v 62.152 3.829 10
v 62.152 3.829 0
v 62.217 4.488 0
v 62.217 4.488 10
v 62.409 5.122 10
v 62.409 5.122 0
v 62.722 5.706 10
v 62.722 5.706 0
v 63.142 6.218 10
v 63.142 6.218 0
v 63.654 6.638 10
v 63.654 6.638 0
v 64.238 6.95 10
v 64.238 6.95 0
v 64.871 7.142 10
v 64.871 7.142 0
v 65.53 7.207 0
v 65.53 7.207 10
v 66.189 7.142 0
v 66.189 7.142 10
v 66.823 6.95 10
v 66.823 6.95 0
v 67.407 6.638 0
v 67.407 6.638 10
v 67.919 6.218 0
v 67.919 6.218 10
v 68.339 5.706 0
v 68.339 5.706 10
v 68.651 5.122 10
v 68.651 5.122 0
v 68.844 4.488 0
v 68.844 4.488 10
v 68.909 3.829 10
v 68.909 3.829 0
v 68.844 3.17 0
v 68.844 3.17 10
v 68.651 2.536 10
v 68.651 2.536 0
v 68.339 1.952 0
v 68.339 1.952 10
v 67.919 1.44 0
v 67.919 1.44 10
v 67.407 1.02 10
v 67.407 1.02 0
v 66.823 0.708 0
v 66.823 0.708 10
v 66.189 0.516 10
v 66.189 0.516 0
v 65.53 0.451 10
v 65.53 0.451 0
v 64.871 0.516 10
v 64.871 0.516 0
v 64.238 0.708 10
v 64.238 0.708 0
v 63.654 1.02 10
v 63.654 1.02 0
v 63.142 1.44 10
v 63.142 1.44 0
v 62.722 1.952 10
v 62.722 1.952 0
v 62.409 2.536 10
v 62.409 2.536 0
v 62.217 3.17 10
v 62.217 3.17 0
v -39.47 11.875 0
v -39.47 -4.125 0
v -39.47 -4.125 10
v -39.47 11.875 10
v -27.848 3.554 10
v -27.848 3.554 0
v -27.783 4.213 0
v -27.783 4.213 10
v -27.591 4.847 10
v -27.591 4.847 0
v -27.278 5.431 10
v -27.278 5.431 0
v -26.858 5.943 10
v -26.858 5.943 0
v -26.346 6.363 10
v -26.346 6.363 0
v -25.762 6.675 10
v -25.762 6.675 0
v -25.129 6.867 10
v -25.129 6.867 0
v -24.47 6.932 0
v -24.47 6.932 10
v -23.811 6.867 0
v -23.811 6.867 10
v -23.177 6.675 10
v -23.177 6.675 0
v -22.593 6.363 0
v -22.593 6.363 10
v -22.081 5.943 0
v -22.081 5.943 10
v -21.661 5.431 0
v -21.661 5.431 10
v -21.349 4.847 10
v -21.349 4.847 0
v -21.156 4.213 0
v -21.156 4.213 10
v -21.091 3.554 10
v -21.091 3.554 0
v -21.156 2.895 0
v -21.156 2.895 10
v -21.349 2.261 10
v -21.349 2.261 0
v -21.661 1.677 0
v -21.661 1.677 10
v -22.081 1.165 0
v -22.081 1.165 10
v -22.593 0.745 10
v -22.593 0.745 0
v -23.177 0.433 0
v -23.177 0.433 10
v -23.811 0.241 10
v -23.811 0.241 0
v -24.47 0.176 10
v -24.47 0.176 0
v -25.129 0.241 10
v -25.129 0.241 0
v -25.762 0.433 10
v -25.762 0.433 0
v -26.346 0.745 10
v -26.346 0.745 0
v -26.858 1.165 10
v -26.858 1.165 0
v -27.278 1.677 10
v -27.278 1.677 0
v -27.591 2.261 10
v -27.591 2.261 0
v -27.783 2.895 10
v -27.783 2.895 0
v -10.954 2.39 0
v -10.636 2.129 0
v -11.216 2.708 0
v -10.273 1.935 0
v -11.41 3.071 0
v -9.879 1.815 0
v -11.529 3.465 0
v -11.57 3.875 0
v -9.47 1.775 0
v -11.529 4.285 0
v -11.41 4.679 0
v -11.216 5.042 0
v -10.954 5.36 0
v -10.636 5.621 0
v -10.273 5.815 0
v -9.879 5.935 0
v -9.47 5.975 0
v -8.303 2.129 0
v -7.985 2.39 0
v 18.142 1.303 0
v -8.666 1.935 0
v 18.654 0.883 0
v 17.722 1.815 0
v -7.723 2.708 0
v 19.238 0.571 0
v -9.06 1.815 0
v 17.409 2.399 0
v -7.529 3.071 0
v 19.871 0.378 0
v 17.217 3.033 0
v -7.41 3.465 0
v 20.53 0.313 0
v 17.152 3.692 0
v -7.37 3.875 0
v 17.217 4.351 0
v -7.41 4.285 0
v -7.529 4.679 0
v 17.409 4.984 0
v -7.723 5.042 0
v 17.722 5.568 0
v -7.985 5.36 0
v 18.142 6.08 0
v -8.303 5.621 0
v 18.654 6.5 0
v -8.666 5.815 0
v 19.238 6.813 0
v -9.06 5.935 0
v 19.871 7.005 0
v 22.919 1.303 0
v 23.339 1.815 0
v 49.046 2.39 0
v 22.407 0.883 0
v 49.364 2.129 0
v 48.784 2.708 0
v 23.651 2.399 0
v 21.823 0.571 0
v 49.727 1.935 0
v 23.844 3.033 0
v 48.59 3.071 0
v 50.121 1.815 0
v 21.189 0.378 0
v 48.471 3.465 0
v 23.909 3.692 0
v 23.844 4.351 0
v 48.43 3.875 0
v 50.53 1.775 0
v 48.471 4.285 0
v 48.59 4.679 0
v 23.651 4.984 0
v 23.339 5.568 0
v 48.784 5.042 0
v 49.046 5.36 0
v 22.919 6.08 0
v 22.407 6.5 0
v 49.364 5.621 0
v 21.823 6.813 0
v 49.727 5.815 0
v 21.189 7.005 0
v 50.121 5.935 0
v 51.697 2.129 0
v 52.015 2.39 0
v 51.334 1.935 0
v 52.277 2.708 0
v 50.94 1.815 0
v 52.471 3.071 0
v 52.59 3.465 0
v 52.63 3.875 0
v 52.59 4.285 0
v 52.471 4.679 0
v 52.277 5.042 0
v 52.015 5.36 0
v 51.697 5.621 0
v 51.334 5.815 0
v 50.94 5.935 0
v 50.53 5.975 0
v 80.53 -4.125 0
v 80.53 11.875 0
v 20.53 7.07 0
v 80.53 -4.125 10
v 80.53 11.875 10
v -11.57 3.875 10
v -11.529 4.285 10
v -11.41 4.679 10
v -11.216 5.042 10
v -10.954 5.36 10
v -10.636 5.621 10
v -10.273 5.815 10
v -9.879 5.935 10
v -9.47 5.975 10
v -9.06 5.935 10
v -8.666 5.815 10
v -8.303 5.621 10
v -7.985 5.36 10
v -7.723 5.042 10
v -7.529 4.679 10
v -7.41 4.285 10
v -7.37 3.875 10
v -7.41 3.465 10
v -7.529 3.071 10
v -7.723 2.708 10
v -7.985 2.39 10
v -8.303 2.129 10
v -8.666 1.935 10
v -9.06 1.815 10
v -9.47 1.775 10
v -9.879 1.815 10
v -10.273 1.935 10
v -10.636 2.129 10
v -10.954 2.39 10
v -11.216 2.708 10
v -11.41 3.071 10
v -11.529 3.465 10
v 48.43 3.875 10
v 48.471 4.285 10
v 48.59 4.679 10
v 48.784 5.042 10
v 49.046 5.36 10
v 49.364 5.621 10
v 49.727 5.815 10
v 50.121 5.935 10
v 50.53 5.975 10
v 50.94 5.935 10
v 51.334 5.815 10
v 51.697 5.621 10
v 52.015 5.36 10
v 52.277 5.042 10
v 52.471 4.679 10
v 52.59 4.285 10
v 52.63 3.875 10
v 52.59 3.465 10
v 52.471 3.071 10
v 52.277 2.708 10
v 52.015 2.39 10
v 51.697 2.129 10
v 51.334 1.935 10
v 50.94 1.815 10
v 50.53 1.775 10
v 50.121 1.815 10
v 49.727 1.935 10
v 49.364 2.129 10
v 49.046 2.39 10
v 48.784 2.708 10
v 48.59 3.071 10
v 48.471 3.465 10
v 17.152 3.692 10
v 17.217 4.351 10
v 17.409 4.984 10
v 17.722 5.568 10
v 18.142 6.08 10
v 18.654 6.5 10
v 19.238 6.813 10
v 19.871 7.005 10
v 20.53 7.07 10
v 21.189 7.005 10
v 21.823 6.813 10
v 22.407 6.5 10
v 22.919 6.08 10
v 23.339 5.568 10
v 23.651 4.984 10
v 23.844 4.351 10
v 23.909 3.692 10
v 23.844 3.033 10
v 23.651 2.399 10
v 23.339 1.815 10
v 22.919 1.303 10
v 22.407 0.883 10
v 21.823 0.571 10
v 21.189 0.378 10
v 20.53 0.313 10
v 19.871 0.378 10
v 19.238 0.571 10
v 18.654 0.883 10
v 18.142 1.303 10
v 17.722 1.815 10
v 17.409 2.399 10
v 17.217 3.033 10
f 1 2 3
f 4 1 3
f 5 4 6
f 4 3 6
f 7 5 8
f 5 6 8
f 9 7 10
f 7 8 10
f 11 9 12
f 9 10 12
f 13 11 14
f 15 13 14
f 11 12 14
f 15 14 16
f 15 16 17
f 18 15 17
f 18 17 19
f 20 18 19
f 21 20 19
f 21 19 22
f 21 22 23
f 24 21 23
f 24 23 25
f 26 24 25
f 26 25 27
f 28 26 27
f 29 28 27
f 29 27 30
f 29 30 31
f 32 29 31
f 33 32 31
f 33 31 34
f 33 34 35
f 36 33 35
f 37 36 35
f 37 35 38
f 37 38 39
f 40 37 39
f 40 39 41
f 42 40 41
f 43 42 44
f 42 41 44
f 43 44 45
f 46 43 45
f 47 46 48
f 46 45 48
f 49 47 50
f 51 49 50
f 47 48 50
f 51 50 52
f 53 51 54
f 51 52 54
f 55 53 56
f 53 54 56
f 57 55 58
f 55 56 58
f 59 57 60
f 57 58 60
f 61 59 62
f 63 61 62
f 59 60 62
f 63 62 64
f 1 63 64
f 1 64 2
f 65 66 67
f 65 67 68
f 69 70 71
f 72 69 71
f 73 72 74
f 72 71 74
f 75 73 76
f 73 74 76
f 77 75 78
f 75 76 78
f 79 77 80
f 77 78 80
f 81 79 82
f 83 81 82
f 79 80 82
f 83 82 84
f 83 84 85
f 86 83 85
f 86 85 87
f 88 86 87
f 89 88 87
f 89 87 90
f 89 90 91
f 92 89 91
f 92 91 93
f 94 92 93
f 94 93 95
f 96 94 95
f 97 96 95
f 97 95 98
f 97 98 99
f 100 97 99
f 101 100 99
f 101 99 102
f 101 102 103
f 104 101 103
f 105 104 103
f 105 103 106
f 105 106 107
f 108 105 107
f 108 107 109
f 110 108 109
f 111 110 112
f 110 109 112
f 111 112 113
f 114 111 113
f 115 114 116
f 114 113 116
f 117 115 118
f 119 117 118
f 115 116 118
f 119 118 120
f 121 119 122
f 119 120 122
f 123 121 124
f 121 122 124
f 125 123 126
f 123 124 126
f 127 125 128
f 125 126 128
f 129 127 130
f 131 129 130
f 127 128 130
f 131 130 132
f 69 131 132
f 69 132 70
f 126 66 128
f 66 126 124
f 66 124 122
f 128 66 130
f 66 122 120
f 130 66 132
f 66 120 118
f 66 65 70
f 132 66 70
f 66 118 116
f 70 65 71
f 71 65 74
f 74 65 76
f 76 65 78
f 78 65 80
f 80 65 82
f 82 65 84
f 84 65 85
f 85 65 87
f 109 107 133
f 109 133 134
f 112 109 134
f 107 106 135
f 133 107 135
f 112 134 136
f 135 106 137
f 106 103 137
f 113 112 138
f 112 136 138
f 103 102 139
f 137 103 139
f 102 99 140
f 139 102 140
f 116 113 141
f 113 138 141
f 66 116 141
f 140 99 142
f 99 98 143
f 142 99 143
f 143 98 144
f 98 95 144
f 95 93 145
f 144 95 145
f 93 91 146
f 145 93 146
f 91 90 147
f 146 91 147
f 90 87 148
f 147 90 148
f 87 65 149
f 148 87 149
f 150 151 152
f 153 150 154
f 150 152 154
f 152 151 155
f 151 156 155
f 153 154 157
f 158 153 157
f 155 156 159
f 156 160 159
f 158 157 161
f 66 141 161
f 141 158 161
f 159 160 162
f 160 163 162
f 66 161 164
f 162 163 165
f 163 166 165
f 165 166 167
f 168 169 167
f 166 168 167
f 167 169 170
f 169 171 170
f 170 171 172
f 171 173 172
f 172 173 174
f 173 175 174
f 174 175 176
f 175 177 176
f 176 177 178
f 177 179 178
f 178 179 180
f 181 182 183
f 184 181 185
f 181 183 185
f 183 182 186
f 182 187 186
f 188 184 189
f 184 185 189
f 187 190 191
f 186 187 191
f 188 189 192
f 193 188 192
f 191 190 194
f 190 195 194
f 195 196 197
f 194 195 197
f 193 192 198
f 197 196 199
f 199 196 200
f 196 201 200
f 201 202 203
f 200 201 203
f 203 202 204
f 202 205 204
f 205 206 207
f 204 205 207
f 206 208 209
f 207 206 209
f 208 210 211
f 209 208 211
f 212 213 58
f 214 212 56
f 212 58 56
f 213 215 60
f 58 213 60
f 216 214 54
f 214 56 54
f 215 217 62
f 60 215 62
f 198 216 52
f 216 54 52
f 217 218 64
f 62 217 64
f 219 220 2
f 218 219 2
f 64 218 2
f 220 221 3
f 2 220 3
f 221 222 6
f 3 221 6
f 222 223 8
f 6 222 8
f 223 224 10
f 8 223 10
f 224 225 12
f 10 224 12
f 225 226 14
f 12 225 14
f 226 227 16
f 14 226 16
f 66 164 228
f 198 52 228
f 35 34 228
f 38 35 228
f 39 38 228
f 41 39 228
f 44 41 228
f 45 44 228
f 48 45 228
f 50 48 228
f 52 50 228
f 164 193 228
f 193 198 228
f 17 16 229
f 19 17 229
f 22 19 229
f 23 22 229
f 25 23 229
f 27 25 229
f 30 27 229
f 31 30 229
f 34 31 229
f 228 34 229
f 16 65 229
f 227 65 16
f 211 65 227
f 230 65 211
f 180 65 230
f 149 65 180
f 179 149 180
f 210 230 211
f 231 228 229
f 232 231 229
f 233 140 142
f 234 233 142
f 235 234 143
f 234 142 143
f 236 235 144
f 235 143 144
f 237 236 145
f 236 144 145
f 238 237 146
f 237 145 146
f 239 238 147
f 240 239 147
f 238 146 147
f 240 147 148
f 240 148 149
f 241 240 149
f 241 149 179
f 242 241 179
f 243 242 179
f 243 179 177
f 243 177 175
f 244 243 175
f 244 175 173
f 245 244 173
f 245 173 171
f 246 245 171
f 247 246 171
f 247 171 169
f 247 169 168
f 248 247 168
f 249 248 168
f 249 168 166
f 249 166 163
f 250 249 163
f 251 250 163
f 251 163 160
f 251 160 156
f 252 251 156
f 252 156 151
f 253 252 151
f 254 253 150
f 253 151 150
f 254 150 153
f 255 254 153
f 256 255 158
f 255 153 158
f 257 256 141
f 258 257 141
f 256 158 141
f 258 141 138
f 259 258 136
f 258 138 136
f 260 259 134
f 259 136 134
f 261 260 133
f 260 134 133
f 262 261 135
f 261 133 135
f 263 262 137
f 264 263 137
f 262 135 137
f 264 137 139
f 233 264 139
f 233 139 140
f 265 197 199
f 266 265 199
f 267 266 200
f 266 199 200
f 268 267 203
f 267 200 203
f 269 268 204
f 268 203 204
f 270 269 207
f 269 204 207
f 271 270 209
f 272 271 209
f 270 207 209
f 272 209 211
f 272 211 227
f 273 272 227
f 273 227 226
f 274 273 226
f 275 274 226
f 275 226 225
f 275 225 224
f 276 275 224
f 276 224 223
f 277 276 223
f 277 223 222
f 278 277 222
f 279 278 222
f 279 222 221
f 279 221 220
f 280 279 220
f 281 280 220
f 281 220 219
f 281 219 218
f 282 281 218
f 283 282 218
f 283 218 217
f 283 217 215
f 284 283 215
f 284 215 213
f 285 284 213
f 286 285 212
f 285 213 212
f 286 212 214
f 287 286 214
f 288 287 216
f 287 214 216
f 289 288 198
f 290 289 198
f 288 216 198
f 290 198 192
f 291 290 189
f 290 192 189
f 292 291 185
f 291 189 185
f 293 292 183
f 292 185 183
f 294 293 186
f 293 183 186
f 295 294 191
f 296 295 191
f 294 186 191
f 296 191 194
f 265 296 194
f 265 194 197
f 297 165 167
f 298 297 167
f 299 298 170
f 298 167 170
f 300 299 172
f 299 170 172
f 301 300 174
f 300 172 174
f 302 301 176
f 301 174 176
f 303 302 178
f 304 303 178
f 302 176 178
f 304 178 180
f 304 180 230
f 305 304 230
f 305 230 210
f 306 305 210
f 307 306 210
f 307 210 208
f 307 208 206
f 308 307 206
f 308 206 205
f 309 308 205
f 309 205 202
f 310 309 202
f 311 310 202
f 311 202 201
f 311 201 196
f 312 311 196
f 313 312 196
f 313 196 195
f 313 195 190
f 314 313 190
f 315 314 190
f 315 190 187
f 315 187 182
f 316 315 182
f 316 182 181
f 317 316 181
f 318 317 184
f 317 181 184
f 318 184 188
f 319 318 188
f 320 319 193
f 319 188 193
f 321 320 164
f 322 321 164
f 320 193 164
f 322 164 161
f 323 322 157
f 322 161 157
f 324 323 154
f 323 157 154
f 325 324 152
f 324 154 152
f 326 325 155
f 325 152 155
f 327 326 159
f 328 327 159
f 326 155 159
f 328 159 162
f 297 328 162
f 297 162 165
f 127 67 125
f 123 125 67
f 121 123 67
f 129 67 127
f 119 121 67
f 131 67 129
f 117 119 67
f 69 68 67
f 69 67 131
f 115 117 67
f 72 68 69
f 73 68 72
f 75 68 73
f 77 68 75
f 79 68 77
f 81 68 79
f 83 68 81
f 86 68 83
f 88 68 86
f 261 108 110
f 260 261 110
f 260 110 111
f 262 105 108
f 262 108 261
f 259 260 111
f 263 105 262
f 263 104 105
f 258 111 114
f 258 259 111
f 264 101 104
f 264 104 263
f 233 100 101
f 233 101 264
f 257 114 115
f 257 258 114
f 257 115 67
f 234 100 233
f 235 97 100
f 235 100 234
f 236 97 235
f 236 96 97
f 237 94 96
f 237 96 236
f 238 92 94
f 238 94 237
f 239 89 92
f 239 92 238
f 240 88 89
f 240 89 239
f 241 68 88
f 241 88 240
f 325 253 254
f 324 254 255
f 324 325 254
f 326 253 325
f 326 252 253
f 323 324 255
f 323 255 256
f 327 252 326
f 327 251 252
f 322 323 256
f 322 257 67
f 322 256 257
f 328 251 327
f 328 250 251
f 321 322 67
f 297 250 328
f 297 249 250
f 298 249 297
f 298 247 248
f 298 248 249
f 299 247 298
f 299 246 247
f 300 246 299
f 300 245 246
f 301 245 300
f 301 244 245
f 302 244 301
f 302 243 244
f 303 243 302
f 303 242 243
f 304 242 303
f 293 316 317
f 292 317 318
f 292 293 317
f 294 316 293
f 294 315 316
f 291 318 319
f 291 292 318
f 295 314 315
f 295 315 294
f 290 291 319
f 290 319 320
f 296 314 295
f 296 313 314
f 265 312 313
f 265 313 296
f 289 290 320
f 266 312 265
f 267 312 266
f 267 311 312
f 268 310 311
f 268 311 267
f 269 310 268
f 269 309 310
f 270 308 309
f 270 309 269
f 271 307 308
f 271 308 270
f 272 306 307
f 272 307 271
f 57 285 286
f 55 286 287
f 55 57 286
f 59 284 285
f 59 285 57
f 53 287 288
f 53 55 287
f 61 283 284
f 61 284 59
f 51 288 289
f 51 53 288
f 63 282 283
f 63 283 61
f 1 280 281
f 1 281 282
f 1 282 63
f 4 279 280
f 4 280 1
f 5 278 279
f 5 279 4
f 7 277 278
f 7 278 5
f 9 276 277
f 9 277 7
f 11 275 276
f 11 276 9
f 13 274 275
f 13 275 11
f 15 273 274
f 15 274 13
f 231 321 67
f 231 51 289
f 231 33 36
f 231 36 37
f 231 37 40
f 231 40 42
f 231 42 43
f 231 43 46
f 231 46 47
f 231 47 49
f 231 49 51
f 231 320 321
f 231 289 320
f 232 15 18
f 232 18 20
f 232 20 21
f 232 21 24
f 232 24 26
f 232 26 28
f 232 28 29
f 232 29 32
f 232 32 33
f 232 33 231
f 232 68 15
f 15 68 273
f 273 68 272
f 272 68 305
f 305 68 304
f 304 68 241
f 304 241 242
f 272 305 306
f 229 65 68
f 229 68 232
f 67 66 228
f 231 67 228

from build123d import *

# Parameters (mm, degrees)
CROQUIS1_W                                 = 120
CROQUIS1_H                                 = 16
SALIENTE_EXTRUIR1_DEPTH                    = 10
PERFORADOR_PARA_ROSCAR_PARA_MACHO_DE_ROS_D = 4.2
TALADRO_DE_MARGEN_PARA_1_41_D              = 6.7564


with BuildPart() as part:
    # Croquis1 → Saliente-Extruir1 (new body)
    with BuildSketch(Plane.XY):
        with Locations((20.530427632, 3.875)):
            Rectangle(CROQUIS1_W, CROQUIS1_H)
    extrude(amount=SALIENTE_EXTRUIR1_DEPTH)

    # Perforador para roscar para macho de roscar para M5x0.81 (through all)
    with Locations(Plane.XY.offset(10)):
        with Locations((-9.469572368, 3.875), (50.530427632, 3.875)):
            Hole(PERFORADOR_PARA_ROSCAR_PARA_MACHO_DE_ROS_D / 2)

    # Taladro de margen para 1/41 (through all)
    with Locations(Plane.XY.offset(10)):
        with Locations((-24.469572368, 3.554018425), (20.530427632, 3.691581957), (65.530427632, 3.829145489)):
            Hole(TALADRO_DE_MARGEN_PARA_1_41_D / 2)


solid = part.part
